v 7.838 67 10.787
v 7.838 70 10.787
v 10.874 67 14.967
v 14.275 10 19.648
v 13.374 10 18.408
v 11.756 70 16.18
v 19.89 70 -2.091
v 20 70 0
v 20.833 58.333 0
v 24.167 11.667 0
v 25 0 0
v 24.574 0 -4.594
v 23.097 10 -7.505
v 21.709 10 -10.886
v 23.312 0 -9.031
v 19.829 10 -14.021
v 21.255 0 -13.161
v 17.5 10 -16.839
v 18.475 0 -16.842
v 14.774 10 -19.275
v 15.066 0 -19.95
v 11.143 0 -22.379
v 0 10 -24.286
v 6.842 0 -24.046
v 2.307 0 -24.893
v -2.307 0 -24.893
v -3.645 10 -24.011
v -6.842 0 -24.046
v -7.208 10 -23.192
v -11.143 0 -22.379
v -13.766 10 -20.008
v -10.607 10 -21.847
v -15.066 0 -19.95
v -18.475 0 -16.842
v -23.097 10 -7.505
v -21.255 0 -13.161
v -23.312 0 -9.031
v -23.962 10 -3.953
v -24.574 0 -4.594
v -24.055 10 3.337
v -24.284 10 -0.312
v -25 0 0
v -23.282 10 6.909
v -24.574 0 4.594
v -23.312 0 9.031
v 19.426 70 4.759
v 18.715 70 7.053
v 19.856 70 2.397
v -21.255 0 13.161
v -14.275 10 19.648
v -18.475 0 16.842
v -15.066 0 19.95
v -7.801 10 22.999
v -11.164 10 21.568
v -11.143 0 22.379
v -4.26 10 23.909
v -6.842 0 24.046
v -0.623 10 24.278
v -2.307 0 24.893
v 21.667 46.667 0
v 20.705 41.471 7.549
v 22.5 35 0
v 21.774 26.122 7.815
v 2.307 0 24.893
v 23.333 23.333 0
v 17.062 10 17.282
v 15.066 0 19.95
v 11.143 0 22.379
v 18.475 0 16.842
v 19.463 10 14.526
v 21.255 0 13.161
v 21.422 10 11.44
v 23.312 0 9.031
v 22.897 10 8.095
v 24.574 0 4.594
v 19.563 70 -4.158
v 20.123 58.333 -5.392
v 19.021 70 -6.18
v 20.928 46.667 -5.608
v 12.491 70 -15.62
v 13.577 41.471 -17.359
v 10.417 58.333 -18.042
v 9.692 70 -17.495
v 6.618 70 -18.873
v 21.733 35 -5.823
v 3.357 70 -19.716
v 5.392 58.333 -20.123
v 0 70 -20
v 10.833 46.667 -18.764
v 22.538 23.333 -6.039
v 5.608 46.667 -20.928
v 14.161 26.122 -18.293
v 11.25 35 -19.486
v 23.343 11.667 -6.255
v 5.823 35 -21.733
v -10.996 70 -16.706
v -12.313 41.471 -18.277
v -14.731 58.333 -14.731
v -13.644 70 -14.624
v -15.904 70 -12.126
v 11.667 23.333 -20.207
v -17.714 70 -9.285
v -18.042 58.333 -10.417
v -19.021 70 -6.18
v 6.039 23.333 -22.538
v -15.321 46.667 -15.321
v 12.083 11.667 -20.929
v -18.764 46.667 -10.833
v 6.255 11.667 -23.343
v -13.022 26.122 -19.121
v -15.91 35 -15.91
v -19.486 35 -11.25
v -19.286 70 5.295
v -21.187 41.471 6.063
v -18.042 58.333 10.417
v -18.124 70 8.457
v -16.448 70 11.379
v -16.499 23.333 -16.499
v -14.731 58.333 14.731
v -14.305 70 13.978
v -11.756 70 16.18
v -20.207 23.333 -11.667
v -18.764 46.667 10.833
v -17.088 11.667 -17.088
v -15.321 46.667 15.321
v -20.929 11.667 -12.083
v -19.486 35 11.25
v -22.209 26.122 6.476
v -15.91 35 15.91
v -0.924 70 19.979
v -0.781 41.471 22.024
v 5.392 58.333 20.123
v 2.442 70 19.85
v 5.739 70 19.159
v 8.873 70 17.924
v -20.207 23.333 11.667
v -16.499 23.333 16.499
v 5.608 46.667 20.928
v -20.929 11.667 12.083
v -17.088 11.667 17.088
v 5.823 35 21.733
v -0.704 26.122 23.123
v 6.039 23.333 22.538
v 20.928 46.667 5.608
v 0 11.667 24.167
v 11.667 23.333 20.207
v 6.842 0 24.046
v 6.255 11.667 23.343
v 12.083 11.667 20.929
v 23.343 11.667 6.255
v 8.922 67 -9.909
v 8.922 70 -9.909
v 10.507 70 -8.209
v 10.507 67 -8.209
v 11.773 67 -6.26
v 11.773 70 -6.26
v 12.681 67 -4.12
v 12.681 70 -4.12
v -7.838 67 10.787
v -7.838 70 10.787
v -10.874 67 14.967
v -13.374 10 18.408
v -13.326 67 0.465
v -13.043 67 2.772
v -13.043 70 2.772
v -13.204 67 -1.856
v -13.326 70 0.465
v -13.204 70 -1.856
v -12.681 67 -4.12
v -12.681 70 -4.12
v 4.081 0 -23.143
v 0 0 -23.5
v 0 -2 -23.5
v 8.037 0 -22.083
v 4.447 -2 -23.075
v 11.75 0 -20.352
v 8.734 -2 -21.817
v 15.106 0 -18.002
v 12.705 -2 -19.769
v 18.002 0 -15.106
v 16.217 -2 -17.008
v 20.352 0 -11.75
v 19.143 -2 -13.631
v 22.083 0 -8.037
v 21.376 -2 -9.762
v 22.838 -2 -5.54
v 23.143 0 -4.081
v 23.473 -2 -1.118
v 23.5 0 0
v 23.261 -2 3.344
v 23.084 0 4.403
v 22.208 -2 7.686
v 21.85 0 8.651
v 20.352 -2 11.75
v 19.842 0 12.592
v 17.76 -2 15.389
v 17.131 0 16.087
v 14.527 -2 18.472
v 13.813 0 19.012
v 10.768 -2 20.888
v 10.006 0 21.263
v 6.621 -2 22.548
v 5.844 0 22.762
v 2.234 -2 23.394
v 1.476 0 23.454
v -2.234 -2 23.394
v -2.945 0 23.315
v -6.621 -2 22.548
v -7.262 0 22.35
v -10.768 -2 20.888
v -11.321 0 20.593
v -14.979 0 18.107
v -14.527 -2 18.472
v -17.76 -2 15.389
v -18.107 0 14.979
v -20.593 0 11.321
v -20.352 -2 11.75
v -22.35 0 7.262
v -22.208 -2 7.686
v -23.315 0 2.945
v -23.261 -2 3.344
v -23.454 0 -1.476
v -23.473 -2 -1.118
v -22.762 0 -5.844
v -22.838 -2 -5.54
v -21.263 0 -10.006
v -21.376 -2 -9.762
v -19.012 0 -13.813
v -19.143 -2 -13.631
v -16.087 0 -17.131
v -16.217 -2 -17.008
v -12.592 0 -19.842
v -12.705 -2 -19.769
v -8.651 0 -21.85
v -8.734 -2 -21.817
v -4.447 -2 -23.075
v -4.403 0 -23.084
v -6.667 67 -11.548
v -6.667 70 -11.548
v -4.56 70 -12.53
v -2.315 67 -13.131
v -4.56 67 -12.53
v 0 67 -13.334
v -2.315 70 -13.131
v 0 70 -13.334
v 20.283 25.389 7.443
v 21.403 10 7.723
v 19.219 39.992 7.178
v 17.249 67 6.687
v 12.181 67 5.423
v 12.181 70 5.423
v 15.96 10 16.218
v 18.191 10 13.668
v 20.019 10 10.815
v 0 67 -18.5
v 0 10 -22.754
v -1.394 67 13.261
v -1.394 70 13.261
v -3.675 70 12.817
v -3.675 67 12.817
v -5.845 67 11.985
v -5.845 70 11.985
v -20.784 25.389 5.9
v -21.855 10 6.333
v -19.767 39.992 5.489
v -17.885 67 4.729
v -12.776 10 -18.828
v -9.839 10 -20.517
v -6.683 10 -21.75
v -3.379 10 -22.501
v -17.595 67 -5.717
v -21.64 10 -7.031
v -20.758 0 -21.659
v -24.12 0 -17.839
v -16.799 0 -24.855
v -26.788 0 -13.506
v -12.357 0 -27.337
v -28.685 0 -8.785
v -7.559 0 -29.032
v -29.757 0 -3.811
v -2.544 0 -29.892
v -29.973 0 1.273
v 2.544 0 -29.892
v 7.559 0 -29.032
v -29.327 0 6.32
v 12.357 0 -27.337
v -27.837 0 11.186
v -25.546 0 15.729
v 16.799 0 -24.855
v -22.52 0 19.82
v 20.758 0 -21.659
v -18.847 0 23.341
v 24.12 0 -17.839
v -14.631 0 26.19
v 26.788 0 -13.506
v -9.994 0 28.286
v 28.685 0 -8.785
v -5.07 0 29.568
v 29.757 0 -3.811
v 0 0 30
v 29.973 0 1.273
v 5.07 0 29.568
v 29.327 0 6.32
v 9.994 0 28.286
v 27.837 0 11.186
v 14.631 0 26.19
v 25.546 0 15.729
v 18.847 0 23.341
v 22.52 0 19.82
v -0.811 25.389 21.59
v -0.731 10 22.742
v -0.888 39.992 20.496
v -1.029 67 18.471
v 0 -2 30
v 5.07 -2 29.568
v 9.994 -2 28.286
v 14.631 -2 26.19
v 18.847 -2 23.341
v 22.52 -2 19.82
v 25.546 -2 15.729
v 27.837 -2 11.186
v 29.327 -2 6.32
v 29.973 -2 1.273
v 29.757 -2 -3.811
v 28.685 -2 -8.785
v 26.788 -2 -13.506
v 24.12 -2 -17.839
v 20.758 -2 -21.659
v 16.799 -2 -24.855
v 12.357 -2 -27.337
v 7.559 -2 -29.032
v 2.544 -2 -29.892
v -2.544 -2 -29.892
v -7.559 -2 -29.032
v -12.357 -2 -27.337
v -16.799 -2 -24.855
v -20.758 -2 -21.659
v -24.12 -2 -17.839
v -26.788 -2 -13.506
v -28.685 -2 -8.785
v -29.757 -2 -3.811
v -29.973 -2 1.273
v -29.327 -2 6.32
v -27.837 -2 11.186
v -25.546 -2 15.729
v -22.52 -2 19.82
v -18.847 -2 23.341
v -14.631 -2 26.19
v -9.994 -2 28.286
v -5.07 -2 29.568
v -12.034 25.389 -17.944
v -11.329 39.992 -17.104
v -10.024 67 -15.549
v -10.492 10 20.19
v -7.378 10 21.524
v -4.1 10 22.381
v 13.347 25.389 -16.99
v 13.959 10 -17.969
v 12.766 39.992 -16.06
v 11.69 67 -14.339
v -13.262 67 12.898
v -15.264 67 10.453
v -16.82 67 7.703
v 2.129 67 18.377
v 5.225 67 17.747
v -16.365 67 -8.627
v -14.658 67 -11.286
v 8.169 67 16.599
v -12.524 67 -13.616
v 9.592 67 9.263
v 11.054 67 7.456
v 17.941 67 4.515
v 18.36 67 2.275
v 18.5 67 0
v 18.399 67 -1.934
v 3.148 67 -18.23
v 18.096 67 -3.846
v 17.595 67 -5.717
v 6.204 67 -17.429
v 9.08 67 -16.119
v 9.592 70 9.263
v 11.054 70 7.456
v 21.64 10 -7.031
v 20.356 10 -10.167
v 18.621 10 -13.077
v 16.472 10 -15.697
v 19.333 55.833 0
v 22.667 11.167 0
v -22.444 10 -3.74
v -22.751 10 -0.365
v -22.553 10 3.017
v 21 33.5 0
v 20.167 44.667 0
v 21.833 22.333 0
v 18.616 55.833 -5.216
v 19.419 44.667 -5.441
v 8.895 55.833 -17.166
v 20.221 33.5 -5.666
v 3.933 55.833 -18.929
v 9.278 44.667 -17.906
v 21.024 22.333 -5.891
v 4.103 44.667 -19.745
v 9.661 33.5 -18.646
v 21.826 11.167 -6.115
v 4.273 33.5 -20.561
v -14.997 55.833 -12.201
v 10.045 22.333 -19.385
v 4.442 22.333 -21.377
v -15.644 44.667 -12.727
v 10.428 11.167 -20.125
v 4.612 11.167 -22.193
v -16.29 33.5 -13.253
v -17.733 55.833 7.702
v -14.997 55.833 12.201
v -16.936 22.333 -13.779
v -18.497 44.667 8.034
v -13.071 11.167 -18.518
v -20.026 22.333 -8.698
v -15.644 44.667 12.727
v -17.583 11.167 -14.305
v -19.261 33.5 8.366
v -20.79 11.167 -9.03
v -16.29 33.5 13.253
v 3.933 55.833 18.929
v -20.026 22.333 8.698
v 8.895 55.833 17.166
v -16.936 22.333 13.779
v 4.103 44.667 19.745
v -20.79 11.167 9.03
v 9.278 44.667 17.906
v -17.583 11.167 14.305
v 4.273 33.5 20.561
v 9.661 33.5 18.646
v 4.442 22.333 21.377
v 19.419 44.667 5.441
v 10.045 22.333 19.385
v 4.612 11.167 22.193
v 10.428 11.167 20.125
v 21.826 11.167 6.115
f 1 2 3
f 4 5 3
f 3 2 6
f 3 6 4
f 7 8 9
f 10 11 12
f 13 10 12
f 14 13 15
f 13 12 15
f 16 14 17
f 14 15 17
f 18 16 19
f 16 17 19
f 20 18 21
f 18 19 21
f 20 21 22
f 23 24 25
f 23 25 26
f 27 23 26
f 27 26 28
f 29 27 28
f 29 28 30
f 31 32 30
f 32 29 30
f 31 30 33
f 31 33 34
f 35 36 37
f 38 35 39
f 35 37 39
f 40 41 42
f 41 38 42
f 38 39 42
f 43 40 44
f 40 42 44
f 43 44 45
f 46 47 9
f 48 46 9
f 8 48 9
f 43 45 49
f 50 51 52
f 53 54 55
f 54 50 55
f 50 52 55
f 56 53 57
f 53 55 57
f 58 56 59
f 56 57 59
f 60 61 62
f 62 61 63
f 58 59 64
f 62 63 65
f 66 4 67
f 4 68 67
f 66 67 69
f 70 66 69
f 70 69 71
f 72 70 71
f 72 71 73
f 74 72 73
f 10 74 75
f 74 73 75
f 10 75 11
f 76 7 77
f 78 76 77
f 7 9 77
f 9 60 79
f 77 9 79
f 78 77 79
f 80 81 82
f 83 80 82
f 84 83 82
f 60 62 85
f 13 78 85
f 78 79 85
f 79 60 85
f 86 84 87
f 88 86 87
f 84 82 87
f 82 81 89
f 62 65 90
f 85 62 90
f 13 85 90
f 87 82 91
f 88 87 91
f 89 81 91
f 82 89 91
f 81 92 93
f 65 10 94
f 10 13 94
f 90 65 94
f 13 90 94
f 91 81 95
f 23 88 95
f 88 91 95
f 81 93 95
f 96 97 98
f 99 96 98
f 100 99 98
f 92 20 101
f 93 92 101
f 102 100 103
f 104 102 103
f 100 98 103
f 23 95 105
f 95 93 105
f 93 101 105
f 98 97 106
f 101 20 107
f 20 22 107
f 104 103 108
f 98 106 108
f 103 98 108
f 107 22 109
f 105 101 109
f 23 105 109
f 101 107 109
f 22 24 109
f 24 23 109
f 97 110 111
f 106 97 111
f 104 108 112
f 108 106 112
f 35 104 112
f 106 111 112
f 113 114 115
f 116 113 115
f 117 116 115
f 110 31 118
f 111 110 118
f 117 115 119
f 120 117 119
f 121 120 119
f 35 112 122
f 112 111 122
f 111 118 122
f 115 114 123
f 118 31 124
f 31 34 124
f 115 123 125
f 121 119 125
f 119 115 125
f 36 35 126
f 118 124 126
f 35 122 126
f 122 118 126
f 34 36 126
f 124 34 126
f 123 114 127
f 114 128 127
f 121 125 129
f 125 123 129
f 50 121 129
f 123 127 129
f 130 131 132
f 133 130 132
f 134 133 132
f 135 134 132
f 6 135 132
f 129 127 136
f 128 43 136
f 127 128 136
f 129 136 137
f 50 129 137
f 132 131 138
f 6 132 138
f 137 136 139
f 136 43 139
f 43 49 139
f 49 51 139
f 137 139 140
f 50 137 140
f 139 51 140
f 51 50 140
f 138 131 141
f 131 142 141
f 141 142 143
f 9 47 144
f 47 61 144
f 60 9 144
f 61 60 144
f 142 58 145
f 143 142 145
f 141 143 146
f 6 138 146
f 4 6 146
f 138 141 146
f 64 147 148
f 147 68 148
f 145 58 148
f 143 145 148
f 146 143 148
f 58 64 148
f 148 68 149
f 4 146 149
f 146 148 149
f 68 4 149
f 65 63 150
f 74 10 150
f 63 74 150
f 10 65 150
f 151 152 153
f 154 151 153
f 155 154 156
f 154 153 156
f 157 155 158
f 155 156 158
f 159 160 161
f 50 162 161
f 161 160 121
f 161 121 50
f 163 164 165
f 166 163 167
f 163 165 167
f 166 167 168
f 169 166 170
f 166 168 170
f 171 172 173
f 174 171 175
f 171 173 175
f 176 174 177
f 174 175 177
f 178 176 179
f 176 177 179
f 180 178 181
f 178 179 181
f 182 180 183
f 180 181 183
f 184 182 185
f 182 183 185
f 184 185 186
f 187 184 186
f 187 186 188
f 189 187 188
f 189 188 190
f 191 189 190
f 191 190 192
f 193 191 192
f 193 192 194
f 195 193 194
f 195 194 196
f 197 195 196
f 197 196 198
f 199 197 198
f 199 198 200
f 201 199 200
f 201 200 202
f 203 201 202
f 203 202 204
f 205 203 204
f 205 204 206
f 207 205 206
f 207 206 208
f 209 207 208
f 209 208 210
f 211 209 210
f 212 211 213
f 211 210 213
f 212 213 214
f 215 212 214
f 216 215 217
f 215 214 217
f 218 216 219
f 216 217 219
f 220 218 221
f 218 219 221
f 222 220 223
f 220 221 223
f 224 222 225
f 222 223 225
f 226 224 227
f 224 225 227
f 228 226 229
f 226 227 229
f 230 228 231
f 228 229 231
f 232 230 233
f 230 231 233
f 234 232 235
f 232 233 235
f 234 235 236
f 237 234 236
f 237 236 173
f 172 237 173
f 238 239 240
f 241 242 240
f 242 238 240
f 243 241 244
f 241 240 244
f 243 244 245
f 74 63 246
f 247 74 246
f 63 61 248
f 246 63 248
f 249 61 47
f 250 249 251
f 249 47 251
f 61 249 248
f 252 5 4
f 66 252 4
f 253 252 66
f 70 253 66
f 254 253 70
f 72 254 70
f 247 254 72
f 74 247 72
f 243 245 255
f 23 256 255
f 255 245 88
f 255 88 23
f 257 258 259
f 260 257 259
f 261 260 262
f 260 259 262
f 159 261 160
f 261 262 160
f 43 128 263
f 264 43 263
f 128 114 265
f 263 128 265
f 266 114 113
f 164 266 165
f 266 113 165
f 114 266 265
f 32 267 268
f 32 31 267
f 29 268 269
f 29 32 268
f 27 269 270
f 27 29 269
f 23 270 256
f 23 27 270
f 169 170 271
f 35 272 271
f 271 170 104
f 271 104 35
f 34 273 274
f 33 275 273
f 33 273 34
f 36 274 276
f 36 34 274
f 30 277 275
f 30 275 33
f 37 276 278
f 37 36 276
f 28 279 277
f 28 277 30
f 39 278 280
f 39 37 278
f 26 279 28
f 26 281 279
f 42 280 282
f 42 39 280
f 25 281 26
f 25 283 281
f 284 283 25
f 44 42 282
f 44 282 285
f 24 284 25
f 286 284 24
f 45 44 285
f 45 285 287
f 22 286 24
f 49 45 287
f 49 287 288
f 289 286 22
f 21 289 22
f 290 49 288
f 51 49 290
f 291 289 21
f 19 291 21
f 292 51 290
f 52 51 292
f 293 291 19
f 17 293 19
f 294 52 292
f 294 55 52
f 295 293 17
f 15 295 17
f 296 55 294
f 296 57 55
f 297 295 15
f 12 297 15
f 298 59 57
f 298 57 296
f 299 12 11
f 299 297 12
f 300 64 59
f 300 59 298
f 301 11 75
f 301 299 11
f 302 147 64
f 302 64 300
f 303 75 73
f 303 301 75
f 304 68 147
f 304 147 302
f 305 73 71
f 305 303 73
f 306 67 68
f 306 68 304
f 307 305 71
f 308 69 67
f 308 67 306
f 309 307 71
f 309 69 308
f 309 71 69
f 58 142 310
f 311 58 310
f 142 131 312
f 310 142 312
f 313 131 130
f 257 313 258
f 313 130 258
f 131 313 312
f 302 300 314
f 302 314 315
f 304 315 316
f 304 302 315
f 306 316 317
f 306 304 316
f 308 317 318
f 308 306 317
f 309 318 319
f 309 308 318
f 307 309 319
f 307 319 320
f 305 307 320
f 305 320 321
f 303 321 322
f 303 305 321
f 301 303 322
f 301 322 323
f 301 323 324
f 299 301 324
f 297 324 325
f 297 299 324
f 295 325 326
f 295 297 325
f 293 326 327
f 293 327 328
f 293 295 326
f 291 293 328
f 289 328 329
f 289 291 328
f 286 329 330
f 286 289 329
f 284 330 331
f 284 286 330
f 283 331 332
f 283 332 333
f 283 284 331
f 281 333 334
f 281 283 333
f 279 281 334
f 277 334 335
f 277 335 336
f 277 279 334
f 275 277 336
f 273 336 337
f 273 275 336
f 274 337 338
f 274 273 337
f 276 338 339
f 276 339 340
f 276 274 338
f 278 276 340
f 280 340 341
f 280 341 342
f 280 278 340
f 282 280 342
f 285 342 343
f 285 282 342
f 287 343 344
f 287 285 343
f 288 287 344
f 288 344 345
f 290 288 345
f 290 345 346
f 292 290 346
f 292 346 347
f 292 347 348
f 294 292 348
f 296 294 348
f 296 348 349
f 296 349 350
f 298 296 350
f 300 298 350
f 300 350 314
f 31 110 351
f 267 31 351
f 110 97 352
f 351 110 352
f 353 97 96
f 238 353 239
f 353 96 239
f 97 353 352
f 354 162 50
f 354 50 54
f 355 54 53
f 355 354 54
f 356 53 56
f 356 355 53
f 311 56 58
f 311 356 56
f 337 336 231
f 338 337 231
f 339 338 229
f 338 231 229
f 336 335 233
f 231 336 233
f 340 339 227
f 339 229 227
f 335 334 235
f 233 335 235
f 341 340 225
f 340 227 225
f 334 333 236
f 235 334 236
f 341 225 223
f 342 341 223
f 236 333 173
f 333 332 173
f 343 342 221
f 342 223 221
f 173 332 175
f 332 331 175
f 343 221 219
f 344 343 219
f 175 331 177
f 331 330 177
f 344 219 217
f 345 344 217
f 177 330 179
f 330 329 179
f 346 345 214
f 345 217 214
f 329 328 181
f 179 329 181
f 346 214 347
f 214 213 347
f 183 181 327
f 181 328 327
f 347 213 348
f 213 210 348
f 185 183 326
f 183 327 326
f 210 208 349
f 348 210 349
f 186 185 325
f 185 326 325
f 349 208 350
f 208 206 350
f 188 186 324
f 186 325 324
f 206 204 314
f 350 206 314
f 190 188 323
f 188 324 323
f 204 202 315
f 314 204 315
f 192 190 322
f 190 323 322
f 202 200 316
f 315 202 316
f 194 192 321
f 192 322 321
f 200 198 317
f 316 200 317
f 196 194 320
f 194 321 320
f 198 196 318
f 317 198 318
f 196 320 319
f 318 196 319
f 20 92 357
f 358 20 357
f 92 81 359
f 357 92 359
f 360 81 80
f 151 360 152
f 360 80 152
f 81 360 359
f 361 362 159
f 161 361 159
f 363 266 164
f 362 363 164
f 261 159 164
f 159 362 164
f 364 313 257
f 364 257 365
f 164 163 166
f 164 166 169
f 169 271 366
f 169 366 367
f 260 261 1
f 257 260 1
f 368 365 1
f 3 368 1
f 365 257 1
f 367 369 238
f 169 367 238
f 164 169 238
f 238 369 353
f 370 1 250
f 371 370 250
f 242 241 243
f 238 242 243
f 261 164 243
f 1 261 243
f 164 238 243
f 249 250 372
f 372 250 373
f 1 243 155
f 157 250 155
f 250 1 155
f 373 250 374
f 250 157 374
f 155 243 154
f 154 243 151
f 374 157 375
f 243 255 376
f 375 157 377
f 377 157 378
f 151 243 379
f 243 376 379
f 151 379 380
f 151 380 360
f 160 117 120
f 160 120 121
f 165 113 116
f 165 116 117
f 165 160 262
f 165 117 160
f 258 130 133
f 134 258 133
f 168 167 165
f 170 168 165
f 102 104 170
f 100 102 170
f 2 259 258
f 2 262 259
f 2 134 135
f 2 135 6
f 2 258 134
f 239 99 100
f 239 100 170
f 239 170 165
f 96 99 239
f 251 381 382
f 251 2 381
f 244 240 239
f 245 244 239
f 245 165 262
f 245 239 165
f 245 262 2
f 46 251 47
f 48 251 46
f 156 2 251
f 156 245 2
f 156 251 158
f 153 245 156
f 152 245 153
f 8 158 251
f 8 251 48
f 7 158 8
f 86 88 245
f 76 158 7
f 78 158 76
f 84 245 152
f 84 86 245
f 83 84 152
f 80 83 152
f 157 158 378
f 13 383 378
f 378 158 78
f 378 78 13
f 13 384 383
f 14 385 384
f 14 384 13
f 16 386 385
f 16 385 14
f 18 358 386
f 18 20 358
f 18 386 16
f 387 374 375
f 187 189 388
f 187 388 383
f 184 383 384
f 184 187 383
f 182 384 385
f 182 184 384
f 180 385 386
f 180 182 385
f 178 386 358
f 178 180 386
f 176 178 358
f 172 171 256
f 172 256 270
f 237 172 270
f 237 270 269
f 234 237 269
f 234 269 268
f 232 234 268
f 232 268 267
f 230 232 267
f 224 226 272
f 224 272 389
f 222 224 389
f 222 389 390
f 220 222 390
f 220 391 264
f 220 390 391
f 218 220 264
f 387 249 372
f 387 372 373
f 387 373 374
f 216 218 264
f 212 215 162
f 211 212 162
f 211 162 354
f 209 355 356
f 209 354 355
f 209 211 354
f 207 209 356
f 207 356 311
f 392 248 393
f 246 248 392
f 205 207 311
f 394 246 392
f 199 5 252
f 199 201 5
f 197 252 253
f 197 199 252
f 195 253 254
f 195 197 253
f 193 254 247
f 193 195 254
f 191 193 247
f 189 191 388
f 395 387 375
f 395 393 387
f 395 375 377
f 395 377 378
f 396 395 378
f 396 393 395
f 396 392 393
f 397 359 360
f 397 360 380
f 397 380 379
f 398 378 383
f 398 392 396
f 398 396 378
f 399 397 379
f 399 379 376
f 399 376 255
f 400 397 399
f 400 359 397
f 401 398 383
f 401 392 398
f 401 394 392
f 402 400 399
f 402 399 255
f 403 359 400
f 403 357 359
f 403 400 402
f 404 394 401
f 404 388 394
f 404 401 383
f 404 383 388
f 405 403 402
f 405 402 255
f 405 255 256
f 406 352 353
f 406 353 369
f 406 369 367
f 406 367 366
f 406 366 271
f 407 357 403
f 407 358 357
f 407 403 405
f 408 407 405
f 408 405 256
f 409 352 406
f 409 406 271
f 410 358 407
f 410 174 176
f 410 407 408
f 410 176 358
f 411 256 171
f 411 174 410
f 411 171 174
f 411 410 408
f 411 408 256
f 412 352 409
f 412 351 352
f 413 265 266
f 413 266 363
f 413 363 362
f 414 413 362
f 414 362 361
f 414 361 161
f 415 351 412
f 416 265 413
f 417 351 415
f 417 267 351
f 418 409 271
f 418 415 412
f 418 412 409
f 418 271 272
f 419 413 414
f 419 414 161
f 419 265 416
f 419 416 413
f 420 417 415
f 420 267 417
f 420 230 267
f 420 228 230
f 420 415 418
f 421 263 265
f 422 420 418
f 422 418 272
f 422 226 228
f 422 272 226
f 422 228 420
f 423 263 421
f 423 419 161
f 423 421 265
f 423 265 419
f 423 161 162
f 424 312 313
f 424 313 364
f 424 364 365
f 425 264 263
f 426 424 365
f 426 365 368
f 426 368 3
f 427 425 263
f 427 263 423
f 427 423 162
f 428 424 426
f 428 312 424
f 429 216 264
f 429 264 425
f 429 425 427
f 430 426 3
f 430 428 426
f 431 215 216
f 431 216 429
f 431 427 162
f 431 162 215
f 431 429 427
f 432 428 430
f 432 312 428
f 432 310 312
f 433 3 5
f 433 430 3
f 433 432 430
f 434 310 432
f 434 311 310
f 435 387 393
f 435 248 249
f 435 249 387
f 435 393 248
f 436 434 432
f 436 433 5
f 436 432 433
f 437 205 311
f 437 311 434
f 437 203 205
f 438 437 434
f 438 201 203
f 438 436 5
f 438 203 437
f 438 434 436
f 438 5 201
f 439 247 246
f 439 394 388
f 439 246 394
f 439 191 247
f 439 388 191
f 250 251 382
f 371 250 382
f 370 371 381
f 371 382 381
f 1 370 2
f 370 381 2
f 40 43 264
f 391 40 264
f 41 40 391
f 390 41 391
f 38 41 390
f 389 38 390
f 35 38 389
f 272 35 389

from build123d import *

# Parameters (mm, degrees)
SKETCH6_R           = 20
SKETCH4_R           = 25
SKETCH8_R           = 18.5
SKETCH7_R           = 23.5
SKETCH9_R           = 30
BOSS_EXTRUDE1_DEPTH = 2
SKETCH10_R          = 23.5
CUT_EXTRUDE2_DEPTH  = 2
CUT_EXTRUDE4_DEPTH  = 60


with BuildPart() as part:
    # Sketch6 → Loft1 section 0
    with BuildSketch(Plane(origin=(0, 70, 0), x_dir=(1, 0, 0), z_dir=(0, 1, 0))):
        Circle(SKETCH6_R)
    # Sketch4 → Loft1 section 1
    with BuildSketch(Plane(origin=(0, 0, 0), x_dir=(1, 0, 0), z_dir=(0, 1, 0))):
        Circle(SKETCH4_R)
    loft()

    # Sketch8 → Cut-Loft2 section 0
    with BuildSketch(Plane(origin=(0, 67, 0), x_dir=(1, 0, 0), z_dir=(0, 1, 0))):
        Circle(SKETCH8_R)
    # Sketch7 → Cut-Loft2 section 1
    with BuildSketch(Plane.XZ):
        Circle(SKETCH7_R)
    loft(mode=Mode.SUBTRACT)

    # Sketch9 → Boss-Extrude1 (add)
    with BuildSketch(Plane(origin=(0, 0, 0), x_dir=(1, 0, 0), z_dir=(0, 1, 0))):
        with Locations(Location((0, 0, 0), (0, 0, 270))):
            Circle(SKETCH9_R)
    extrude(amount=-BOSS_EXTRUDE1_DEPTH)

    # Sketch10 → Cut-Extrude2 (cut)
    with BuildSketch(Plane.XZ.offset(2)):
        with Locations(Location((0, 0, 0), (0, 0, 270))):
            Circle(SKETCH10_R)
    extrude(amount=-CUT_EXTRUDE2_DEPTH, mode=Mode.SUBTRACT)

    # Sketch11 → Cut-Extrude4 (cut)
    with BuildSketch(Plane(origin=(0, 70, 0), x_dir=(1, 0, 0), z_dir=(0, 1, 0))):
        with BuildLine():
            Line((0, 13.334004414), (0, 25))
            ThreePointArc((0, 25), (-7.452245669, 23.86344557), (-14.226900712, 20.557122759))
            Line((-14.226900712, 20.557122759), (-6.667002207, 11.547586557))
            ThreePointArc((-6.667002207, 11.547586557), (-3.45109429, 12.879659232), (0, 13.334004414))
        make_face()
        with BuildLine():
            Line((12.681391787, 4.120433967), (23.776412907, 7.725424859))
            ThreePointArc((23.776412907, 7.725424859), (20.392614853, 14.46171703), (15.154631459, 19.883086917))
            Line((15.154631459, 19.883086917), (8.922190459, 9.909096384))
            ThreePointArc((8.922190459, 9.909096384), (11.182837055, 7.262219297), (12.681391787, 4.120433967))
        make_face()
        with BuildLine():
            Line((7.837531149, -10.787436174), (14.694631307, -20.225424859))
            ThreePointArc((14.694631307, -20.225424859), (20.055574767, -14.92561291), (23.59297804, -8.268699244))
            Line((23.59297804, -8.268699244), (12.181219165, -5.423428194))
            ThreePointArc((12.181219165, -5.423428194), (10.362467681, -8.391360872), (7.837531149, -10.787436174))
        make_face()
        with BuildLine():
            Line((-7.837531149, -10.787436174), (-14.694631307, -20.225424859))
            ThreePointArc((-14.694631307, -20.225424859), (-7.997587983, -23.686253111), (-0.573369135, -24.993424092))
            Line((-0.573369135, -24.993424092), (-1.393782991, -13.260959343))
            ThreePointArc((-1.393782991, -13.260959343), (-4.778479821, -12.448365528), (-7.837531149, -10.787436174))
        make_face()
        with BuildLine():
            Line((-12.681391787, 4.120433967), (-23.776412907, 7.725424859))
            ThreePointArc((-23.776412907, 7.725424859), (-24.998355969, 0.286703421), (-23.947339654, -7.17808634))
            Line((-23.947339654, -7.17808634), (-13.042624426, -2.772295403))
            ThreePointArc((-13.042624426, -2.772295403), (-13.315730625, 0.697847872), (-12.681391787, 4.120433967))
        make_face()
    extrude(amount=-CUT_EXTRUDE4_DEPTH, mode=Mode.SUBTRACT)


solid = part.part
